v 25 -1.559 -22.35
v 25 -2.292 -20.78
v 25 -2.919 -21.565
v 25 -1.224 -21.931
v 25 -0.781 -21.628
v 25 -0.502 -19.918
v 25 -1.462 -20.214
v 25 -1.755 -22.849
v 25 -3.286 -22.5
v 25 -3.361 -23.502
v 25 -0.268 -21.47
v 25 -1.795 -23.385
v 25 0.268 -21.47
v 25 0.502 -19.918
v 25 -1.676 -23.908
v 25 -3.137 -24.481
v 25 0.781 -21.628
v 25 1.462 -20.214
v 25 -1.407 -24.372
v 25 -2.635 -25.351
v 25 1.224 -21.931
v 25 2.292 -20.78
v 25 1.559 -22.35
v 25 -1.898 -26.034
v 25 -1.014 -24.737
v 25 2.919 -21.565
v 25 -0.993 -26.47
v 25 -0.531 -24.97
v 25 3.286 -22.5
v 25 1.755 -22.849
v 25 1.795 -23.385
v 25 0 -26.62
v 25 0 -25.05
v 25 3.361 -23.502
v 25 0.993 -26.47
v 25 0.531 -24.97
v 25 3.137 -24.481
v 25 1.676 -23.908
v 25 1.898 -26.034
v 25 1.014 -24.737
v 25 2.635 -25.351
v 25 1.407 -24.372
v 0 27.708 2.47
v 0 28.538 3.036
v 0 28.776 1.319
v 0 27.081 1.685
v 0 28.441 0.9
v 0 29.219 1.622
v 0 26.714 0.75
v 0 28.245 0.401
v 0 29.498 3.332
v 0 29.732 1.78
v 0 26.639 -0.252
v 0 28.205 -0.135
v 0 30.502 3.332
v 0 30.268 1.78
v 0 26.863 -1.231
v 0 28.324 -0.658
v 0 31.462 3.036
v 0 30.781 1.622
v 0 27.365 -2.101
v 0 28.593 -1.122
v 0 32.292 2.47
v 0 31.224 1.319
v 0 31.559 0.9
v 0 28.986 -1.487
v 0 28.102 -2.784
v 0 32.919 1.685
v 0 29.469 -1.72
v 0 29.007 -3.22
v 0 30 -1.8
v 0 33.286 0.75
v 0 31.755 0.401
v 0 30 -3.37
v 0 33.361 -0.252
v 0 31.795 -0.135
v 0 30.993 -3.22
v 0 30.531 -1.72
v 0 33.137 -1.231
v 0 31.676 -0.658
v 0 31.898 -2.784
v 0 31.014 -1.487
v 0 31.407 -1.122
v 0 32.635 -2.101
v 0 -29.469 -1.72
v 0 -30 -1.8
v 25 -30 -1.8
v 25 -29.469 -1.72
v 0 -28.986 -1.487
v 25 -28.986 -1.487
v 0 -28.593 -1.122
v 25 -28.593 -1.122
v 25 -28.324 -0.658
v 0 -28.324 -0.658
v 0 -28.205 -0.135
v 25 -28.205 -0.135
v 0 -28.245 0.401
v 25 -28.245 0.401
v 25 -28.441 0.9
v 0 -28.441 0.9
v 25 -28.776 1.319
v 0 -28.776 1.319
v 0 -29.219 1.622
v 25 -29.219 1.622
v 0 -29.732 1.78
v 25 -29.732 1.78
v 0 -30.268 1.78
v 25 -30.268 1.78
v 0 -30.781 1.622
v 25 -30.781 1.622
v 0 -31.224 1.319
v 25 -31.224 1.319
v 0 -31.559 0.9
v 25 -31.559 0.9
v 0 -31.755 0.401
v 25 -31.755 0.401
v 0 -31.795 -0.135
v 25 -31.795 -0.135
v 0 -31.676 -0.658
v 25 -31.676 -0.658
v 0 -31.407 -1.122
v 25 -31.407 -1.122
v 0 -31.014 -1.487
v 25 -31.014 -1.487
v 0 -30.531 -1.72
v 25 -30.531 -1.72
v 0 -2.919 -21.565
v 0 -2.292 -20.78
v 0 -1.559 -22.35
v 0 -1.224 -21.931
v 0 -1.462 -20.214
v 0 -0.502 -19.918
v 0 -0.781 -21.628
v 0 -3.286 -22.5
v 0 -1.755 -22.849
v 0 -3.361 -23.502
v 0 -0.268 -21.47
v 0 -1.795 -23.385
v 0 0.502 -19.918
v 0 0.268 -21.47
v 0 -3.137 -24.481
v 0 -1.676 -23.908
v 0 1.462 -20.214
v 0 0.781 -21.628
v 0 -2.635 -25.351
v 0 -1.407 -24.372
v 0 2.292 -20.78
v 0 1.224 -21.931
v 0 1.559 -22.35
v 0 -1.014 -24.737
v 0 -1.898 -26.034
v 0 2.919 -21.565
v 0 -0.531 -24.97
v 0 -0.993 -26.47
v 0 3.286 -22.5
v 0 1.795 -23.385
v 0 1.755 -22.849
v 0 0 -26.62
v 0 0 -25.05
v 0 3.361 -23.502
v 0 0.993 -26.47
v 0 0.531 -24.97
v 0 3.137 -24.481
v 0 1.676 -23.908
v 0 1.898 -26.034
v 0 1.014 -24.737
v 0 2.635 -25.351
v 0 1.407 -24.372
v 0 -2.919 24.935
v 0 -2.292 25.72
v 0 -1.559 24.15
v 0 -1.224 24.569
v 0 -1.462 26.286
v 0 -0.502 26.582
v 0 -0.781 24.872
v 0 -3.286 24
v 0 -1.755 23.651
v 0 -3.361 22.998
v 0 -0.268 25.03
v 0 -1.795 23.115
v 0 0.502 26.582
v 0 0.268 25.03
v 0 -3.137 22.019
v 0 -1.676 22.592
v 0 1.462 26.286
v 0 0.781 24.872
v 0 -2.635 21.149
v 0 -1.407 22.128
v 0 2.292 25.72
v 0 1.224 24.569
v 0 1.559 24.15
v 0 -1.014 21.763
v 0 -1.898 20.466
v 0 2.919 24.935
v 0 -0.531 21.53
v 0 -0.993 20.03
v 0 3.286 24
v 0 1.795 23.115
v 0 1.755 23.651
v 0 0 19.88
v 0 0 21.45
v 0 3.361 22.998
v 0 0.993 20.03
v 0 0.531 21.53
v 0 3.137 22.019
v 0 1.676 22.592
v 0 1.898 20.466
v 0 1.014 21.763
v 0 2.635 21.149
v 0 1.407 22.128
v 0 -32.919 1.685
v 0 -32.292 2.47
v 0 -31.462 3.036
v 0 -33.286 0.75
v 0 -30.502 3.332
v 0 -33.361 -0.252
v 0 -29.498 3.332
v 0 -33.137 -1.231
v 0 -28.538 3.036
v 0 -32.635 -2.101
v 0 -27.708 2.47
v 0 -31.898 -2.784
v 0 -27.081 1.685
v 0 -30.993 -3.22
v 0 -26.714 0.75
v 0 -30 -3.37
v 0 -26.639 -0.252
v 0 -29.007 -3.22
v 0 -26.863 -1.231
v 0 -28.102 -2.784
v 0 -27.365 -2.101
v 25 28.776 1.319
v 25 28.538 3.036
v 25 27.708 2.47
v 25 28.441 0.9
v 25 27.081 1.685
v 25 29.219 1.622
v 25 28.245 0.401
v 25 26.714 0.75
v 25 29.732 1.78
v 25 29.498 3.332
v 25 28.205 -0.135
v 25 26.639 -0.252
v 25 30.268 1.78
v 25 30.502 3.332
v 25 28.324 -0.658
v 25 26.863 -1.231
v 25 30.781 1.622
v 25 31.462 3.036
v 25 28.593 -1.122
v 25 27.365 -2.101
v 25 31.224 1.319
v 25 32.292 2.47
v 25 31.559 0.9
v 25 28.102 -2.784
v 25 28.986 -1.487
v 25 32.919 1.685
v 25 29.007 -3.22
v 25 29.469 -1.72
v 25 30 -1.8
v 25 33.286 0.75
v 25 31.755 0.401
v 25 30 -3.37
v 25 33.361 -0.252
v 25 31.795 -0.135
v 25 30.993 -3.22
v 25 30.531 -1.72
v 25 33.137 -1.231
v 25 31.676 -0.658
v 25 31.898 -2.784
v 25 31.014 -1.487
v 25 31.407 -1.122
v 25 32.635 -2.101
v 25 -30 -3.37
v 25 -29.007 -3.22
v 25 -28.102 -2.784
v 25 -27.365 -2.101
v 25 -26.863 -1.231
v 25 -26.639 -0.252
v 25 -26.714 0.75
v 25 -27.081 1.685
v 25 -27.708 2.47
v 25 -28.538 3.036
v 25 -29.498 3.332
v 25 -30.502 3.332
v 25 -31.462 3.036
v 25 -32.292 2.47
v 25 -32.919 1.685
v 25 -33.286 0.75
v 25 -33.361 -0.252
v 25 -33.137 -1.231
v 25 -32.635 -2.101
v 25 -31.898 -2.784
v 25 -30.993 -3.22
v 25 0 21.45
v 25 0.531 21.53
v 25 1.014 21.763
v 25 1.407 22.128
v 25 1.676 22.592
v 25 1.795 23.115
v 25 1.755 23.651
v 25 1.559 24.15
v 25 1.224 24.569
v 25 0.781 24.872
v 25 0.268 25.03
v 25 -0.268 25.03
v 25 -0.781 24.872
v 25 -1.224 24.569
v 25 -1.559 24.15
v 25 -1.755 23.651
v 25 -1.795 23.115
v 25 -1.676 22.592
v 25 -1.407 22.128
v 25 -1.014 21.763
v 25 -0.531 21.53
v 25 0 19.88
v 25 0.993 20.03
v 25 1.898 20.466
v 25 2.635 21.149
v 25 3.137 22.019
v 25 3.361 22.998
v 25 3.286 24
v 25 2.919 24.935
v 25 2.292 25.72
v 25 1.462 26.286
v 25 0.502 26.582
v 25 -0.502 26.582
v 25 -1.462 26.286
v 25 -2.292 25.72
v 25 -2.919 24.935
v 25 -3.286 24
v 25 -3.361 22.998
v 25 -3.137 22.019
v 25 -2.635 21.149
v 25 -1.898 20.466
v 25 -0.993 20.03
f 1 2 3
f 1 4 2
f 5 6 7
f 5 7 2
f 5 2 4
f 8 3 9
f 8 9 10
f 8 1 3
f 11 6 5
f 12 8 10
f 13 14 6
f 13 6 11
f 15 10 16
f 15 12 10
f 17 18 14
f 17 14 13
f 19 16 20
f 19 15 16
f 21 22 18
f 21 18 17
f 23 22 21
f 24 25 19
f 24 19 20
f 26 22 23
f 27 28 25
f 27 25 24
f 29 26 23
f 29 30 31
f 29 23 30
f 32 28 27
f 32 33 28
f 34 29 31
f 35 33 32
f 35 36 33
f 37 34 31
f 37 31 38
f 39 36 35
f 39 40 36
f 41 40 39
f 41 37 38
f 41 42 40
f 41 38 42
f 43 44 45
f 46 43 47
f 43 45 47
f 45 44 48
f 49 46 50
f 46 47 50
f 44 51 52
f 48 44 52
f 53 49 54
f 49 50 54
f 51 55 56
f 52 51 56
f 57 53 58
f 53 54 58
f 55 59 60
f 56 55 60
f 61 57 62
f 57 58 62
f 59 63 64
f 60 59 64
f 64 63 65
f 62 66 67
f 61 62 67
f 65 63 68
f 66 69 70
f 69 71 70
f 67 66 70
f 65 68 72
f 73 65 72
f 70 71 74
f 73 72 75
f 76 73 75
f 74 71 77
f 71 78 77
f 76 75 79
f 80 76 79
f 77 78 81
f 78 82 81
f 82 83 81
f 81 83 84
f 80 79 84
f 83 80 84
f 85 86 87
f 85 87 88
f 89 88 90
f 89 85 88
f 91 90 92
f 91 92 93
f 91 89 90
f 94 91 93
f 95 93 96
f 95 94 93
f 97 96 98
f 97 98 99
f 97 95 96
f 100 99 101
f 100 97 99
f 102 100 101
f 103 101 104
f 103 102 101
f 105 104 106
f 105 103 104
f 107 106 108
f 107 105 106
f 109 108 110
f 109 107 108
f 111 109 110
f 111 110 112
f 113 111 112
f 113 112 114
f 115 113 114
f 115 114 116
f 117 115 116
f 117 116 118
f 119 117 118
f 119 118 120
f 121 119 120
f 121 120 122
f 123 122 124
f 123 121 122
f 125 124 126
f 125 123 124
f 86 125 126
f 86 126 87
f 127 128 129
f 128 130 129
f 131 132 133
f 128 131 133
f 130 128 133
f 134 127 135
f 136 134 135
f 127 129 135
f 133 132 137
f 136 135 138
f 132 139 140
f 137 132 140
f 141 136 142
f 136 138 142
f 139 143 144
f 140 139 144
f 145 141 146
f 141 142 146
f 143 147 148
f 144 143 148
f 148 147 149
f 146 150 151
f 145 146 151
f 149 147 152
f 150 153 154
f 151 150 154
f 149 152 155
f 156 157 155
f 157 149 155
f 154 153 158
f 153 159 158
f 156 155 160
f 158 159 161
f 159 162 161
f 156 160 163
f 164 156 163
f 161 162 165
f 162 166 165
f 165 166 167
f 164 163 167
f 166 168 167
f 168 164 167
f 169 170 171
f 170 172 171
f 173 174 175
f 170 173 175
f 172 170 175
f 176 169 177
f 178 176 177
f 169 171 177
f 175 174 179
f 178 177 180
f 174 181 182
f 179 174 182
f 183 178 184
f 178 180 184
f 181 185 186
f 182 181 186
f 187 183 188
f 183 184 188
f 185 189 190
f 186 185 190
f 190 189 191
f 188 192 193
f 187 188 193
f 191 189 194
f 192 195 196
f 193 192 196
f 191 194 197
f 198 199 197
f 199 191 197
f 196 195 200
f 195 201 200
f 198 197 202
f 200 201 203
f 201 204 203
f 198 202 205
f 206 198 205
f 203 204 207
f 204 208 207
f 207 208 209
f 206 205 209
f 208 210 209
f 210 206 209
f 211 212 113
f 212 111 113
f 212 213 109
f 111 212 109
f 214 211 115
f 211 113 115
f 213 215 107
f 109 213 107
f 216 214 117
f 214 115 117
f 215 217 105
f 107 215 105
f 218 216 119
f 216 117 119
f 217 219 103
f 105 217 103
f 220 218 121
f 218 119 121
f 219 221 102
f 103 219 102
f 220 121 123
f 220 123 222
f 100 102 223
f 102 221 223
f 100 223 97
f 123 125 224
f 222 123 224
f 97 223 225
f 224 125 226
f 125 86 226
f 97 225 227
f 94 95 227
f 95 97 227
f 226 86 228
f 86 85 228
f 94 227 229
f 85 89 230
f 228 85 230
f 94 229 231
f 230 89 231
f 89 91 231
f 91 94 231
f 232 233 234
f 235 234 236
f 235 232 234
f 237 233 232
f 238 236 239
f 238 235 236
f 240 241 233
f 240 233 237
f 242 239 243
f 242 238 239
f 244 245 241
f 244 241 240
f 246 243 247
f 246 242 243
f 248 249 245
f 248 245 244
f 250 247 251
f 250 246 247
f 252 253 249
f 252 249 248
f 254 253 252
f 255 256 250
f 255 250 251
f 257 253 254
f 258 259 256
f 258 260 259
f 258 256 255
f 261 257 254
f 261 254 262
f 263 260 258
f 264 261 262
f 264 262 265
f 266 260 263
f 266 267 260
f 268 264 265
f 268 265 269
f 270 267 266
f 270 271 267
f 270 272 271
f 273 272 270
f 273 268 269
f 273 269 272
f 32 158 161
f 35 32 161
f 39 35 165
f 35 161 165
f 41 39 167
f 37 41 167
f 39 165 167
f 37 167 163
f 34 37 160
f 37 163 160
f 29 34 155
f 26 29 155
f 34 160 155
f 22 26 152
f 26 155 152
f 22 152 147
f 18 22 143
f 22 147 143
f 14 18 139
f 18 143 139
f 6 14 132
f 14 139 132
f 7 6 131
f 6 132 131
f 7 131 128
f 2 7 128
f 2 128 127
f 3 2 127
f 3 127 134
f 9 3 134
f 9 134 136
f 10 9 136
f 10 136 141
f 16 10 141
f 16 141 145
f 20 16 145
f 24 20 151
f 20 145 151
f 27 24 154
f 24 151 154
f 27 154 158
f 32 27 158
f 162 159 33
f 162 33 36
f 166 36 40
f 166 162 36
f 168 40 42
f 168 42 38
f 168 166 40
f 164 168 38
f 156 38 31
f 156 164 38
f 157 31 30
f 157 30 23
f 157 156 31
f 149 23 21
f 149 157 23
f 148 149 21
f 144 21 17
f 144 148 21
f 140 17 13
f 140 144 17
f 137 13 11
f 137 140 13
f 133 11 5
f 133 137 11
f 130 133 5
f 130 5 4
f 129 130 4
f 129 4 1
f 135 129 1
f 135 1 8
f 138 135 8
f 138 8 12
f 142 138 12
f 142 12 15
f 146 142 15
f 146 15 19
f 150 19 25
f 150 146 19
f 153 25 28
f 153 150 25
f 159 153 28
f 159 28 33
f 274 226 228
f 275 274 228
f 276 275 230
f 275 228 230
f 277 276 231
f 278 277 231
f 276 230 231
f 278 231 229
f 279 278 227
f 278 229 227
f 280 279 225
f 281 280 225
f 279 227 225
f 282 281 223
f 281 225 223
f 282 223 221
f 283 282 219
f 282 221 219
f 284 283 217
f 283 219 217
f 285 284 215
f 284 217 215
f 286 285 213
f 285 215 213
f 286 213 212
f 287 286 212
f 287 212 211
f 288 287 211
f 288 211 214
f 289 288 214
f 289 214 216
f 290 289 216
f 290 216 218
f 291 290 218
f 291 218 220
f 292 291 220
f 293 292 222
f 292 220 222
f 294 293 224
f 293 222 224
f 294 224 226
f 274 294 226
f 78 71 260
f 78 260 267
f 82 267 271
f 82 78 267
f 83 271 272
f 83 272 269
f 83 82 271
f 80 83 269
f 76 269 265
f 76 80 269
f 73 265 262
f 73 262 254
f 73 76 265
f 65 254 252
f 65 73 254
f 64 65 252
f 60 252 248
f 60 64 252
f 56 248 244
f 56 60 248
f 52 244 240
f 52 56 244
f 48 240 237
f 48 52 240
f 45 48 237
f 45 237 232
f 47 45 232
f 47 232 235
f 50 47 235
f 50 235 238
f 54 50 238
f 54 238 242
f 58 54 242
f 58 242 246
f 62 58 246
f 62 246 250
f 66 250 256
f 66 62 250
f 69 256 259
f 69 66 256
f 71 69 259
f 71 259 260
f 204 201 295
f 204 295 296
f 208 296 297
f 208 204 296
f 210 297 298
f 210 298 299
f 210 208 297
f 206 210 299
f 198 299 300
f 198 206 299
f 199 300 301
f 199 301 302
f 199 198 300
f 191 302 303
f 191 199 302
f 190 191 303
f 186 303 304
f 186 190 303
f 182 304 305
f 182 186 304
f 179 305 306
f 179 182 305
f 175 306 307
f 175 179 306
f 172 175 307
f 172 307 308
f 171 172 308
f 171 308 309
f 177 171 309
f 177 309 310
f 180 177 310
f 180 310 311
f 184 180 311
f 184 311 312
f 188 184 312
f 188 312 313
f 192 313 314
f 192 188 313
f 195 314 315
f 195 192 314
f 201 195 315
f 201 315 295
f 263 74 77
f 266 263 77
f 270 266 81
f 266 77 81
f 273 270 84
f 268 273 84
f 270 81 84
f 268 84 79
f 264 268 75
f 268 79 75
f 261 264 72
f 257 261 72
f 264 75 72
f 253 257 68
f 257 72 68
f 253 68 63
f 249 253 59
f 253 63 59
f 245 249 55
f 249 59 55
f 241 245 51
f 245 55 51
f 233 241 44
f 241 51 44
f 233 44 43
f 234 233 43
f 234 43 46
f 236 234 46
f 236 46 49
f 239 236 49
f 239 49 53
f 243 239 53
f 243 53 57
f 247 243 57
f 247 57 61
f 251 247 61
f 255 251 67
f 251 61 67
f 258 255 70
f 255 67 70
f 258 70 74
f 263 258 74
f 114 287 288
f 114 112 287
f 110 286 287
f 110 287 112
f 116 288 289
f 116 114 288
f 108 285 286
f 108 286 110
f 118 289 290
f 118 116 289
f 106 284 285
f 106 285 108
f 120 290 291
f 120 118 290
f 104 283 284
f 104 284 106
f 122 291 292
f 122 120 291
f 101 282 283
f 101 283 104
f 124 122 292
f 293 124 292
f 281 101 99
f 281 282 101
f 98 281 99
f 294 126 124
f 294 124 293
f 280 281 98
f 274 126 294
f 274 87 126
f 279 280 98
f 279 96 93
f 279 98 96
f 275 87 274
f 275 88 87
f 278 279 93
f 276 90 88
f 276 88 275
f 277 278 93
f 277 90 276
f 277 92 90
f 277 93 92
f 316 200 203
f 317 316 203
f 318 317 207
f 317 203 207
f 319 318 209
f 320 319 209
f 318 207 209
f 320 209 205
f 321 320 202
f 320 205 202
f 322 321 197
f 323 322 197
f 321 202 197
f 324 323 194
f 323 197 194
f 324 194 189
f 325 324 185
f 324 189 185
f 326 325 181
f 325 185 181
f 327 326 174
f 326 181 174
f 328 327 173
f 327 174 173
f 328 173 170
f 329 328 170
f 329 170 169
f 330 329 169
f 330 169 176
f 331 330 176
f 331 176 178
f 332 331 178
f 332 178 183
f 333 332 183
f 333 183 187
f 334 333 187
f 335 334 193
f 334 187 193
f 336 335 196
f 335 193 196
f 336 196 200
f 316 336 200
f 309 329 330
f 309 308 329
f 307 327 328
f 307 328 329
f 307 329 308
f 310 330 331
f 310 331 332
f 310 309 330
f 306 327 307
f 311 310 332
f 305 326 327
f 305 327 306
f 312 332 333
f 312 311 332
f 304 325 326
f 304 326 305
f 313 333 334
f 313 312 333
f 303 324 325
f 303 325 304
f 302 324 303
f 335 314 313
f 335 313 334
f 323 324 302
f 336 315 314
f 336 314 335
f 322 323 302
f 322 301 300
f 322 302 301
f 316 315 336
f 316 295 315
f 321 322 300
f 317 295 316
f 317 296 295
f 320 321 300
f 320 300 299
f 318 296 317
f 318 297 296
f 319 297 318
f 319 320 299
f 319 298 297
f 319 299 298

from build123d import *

# Parameters (mm, degrees)
SKETCH3_R             = 3.37
SKETCH3_R_2           = 1.8
BOSS_EXTRUDE1_DEPTH   = 25
BOSS_EXTRUDE1_2_DEPTH = 25
BOSS_EXTRUDE1_3_DEPTH = 25
BOSS_EXTRUDE1_4_DEPTH = 25


with BuildPart() as part:
    # Sketch3 → Boss-Extrude1 (new body)
    with BuildSketch(Plane.YZ):
        with Locations(Location((0, 23.25, 0), (0, 0, 270))):
            Circle(SKETCH3_R)
        with Locations(Location((0, 23.25, 0), (0, 0, 270))):
            Circle(SKETCH3_R_2, mode=Mode.SUBTRACT)
    extrude(amount=BOSS_EXTRUDE1_DEPTH)


with BuildPart() as body_2:
    # Sketch3 → Boss-Extrude1 2 (new body)
    with BuildSketch(Plane.YZ):
        with Locations(Location((30, 0, 0), (0, 0, 270))):
            Circle(SKETCH3_R)
        with Locations(Location((30, 0, 0), (0, 0, 270))):
            Circle(SKETCH3_R_2, mode=Mode.SUBTRACT)
    extrude(amount=BOSS_EXTRUDE1_2_DEPTH)


with BuildPart() as body_3:
    # Sketch3 → Boss-Extrude1 3 (new body)
    with BuildSketch(Plane.YZ):
        with Locations(Location((0, -23.25, 0), (0, 0, 270))):
            Circle(SKETCH3_R)
        with Locations(Location((0, -23.25, 0), (0, 0, 270))):
            Circle(SKETCH3_R_2, mode=Mode.SUBTRACT)
    extrude(amount=BOSS_EXTRUDE1_3_DEPTH)


with BuildPart() as body_4:
    # Sketch3 → Boss-Extrude1 4 (new body)
    with BuildSketch(Plane.YZ):
        with Locations(Location((-30, 0, 0), (0, 0, 270))):
            Circle(SKETCH3_R)
        with Locations(Location((-30, 0, 0), (0, 0, 270))):
            Circle(SKETCH3_R_2, mode=Mode.SUBTRACT)
    extrude(amount=BOSS_EXTRUDE1_4_DEPTH)


solid = Compound([part.part, body_2.part, body_3.part, body_4.part])
